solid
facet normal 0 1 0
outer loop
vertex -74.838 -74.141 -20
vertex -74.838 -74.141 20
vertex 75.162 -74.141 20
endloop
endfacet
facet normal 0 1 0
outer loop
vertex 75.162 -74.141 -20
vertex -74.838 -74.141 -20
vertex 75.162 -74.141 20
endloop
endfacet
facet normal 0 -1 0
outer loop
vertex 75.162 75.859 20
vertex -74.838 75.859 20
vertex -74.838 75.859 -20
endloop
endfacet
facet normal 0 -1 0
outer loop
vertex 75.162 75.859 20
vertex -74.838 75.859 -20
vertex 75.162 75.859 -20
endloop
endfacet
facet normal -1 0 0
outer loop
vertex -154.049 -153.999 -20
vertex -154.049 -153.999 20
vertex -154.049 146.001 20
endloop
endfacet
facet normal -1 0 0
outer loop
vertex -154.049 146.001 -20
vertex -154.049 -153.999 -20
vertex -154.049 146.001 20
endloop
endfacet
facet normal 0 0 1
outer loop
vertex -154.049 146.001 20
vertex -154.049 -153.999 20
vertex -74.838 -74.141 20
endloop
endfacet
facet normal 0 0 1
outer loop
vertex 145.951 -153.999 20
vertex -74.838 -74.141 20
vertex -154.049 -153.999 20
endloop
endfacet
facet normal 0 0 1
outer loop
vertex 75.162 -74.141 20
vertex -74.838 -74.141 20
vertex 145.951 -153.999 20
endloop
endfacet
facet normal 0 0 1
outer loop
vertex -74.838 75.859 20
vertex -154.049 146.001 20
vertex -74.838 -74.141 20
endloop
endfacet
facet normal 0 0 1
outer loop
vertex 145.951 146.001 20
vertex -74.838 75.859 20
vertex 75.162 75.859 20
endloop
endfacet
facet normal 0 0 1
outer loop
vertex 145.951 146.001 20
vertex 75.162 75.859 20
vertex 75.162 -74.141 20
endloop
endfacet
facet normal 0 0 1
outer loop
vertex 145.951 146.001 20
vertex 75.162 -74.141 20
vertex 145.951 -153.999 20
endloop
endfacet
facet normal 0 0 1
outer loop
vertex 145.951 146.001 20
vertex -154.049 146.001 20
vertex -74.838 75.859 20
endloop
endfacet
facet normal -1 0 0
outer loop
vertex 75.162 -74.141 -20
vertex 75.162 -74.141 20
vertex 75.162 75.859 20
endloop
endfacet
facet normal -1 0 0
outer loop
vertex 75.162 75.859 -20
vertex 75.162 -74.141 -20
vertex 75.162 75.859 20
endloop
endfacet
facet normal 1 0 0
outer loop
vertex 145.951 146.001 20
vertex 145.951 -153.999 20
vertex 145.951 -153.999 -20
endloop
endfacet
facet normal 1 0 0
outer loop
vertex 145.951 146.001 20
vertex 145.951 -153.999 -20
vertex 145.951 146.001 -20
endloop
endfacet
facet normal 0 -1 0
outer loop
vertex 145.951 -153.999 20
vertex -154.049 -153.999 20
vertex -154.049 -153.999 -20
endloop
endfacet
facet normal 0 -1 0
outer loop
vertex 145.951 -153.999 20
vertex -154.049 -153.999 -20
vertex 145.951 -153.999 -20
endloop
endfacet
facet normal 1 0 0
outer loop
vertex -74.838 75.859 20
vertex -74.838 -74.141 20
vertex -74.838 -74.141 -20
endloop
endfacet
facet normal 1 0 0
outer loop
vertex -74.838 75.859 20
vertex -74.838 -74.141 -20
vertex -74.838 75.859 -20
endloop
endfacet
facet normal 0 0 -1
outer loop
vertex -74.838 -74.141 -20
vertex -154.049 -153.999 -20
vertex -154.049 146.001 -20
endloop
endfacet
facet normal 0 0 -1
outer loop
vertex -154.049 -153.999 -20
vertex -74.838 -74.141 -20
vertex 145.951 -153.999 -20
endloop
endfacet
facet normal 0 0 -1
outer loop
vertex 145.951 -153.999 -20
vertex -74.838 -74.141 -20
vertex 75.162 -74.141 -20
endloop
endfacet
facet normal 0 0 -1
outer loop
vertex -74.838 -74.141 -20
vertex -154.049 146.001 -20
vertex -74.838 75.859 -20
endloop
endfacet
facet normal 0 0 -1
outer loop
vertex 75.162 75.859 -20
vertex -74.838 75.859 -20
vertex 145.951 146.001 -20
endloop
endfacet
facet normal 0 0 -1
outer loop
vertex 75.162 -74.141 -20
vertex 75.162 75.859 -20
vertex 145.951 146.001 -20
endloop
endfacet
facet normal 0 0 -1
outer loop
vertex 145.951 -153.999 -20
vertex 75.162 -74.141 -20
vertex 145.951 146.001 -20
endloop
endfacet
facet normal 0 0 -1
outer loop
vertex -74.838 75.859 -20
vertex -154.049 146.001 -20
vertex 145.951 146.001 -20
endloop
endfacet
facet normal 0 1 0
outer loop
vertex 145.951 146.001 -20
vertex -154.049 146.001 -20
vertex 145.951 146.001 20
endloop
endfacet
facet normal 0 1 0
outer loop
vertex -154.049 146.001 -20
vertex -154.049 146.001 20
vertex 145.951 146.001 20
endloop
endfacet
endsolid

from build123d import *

# Parameters (mm, degrees)
F0_W     = 300
F0_H     = 300
F1_DEPTH = 20
F2_W     = 150
F2_H     = 150
F3_DEPTH = 50


with BuildPart() as f1:
    # F0 (on Top) → F1 (new body, symmetric)
    with BuildSketch(Plane.XY):
        with Locations((-4.049069, -3.999319)):
            Rectangle(F0_W, F0_H)
    extrude(amount=F1_DEPTH, both=True)

    # F2 (on face) → F3 (cut)
    with BuildSketch(Plane.XY.offset(20)):
        with Locations((0.162162, 0.858896)):
            Rectangle(F2_W, F2_H)
    extrude(amount=-F3_DEPTH, mode=Mode.SUBTRACT)


solid = f1.part
